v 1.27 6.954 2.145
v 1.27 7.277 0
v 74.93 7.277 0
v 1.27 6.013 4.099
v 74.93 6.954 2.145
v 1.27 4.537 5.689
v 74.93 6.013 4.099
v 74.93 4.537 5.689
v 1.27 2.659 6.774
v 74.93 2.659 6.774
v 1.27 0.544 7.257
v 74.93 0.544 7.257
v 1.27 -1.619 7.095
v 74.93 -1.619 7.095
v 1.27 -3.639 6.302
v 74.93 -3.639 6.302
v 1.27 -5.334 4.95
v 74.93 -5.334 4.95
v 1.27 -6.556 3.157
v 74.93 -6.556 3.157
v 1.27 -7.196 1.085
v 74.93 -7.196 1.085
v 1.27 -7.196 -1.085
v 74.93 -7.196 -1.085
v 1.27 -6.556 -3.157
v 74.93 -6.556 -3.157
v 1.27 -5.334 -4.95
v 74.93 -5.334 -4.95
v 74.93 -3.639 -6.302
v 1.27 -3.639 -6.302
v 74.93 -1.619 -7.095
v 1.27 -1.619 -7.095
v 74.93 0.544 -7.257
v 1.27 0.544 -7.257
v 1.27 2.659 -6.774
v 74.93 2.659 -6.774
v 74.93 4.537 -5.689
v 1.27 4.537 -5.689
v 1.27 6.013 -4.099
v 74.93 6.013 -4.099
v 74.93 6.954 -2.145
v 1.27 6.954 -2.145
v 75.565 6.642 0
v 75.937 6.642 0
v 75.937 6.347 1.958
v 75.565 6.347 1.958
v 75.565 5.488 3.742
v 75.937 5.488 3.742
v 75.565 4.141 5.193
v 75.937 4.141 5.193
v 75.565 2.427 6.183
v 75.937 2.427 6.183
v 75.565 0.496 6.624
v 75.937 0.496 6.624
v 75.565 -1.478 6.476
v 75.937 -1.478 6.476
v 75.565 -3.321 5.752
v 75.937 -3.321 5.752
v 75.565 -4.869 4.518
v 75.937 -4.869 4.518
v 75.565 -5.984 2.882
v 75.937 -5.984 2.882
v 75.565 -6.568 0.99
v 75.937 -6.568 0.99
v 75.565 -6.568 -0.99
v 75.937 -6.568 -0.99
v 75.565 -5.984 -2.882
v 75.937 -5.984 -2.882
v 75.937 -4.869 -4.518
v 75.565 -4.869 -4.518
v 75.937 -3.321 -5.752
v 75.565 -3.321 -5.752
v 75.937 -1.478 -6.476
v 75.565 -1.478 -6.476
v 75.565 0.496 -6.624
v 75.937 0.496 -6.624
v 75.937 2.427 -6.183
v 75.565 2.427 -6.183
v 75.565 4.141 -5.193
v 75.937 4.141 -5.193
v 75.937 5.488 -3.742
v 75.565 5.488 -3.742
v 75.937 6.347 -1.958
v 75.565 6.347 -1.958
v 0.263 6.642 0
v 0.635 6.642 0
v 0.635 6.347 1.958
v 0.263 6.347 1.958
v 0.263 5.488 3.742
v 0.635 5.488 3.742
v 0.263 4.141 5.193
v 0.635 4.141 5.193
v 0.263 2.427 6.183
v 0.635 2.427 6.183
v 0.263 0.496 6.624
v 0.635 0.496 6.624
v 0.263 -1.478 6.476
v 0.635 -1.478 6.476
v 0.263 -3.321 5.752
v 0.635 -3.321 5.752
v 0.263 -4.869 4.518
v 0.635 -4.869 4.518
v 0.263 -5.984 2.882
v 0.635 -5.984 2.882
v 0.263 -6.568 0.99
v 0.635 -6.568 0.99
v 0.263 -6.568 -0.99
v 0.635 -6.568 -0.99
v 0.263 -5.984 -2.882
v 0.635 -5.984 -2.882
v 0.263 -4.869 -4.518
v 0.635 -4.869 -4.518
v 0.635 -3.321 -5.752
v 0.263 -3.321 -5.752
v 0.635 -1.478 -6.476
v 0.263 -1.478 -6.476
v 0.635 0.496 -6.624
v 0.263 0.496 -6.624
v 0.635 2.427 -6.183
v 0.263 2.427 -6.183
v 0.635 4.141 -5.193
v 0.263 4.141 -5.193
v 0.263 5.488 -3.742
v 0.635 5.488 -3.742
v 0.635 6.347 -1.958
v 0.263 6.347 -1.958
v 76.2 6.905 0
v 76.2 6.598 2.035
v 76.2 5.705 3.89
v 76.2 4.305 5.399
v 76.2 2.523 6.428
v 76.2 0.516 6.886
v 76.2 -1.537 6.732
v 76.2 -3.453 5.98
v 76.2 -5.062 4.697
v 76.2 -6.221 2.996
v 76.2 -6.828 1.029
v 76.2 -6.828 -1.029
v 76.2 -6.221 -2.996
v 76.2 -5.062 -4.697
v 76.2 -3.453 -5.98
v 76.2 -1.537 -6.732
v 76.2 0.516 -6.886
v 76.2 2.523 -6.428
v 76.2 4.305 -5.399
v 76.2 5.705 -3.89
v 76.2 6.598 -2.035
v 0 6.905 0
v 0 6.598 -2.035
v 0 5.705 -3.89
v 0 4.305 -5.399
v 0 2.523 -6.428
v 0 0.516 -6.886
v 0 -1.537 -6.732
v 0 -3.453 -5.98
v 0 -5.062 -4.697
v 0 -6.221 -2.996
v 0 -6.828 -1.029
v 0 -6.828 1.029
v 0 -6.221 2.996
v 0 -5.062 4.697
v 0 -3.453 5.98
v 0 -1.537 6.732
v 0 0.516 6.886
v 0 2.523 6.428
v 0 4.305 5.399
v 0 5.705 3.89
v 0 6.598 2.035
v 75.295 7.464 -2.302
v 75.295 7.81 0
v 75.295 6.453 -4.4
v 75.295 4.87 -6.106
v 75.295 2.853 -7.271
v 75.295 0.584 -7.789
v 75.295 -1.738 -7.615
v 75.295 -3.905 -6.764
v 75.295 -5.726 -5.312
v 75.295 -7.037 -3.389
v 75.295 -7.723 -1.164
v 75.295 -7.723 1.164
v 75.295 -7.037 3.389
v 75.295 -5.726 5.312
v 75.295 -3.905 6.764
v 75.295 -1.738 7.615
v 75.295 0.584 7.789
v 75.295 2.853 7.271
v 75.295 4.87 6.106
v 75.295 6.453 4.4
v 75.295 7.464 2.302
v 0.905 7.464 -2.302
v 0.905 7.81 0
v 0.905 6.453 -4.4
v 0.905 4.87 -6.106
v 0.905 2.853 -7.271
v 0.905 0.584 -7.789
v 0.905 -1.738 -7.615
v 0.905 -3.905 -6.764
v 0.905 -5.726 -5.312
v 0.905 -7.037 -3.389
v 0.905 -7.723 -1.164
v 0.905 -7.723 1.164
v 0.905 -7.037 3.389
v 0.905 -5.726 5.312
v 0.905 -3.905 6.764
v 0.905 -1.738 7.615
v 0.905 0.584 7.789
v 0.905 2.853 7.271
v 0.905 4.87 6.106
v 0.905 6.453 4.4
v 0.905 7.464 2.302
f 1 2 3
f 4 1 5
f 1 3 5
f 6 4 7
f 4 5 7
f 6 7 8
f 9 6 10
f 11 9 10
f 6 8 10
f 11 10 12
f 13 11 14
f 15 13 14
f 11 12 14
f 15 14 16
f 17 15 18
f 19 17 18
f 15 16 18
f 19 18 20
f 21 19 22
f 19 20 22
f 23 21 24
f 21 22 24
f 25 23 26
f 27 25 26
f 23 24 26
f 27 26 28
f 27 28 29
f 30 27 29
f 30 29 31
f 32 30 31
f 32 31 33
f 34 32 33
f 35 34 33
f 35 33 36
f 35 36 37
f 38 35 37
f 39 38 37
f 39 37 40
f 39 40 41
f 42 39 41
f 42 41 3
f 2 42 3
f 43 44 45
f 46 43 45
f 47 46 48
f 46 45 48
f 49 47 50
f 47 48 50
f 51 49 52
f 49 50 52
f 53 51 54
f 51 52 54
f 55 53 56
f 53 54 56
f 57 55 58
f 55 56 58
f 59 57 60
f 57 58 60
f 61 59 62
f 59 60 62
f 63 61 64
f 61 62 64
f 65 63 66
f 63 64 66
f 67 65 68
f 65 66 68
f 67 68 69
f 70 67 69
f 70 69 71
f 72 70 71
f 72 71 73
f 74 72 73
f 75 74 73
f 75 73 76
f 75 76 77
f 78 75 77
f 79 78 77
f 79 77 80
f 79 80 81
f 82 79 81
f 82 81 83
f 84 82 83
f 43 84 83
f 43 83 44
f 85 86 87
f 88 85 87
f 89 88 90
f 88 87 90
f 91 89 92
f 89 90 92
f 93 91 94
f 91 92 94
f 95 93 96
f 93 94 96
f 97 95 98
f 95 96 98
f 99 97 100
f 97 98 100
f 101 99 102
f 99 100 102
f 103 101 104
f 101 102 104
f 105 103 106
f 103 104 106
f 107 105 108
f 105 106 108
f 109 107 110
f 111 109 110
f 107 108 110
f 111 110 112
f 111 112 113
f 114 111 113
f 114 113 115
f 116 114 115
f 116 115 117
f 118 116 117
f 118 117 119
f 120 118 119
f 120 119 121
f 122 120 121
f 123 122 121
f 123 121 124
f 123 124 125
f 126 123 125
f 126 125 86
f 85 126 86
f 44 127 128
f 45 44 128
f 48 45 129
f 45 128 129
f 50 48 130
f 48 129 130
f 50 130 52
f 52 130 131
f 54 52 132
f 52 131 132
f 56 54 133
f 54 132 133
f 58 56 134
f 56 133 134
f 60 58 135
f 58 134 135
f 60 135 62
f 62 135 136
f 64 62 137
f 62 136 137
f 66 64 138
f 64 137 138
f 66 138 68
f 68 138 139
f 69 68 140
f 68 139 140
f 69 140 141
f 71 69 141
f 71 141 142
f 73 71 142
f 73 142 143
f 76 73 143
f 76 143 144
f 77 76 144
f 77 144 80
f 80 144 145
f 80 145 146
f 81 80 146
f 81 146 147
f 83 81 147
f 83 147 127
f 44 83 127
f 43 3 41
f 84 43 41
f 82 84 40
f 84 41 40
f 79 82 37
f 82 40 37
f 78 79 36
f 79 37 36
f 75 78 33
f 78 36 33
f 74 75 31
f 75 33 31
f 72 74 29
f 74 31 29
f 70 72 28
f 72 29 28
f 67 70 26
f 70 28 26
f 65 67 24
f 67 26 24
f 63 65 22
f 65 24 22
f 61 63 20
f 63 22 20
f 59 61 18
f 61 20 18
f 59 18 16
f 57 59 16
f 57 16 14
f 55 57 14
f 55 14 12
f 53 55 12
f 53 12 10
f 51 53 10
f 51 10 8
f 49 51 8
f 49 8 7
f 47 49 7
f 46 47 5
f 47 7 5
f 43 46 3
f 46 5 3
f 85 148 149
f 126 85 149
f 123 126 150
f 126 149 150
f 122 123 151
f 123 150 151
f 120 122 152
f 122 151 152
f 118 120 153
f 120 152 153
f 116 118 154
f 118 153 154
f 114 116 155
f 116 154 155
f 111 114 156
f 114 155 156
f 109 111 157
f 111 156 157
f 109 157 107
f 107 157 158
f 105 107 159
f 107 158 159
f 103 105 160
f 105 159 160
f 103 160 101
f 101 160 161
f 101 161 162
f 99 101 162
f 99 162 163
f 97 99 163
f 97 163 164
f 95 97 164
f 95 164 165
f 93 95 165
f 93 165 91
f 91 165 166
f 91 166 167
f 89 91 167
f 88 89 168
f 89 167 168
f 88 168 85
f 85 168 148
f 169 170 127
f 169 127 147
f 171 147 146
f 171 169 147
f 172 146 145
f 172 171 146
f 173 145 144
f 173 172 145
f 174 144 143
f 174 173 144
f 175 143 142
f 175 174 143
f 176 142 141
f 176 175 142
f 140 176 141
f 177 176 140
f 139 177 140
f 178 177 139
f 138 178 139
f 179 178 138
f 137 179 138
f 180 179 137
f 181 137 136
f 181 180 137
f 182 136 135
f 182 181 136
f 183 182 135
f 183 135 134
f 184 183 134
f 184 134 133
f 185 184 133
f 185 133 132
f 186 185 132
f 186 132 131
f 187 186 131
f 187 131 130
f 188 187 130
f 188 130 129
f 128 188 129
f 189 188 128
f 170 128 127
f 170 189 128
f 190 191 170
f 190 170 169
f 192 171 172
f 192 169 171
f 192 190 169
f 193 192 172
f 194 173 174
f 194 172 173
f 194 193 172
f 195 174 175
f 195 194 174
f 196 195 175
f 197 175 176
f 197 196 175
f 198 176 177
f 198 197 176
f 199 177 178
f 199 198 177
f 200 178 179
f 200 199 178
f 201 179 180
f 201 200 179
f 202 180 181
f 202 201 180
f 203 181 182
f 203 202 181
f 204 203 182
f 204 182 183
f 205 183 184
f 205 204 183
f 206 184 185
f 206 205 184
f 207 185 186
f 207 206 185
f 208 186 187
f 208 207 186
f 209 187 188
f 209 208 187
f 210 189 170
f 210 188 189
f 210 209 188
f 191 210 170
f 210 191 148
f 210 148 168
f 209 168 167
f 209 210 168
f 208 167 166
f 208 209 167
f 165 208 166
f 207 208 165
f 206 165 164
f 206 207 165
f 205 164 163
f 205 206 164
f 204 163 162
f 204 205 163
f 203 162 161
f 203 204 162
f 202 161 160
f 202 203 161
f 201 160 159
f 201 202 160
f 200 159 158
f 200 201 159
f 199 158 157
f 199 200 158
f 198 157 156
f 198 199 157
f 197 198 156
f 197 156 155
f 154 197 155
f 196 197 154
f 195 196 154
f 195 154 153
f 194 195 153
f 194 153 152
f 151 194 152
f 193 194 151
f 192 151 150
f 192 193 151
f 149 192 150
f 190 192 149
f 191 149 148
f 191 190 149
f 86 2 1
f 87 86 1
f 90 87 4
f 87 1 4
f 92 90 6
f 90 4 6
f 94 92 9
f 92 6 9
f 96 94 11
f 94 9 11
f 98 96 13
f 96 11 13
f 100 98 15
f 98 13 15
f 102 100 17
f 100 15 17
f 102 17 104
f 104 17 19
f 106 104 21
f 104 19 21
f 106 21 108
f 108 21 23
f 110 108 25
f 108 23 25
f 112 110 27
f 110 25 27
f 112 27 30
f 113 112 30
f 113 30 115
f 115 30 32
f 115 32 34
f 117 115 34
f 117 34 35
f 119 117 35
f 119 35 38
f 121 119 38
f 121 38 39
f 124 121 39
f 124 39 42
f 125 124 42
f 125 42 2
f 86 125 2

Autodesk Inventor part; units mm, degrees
sketch "Sketch_5" plane through (0, 0, 0) normal (0, 0, 1) x (1, 0, 0)
  line L0 (76.2, 0) -> (-76.2, 0)
  line L1 (0, 6.9051) -> (0.263, 6.6421)
  line L2 (0.263, 6.6421) -> (0.635, 6.6421)
  line L3 (0.635, 6.6421) -> (1.27, 7.2771)
  line L4 (1.27, 7.2771) -> (74.93, 7.2771)
  line L5 (74.93, 7.2771) -> (75.565, 6.6421)
  line L6 (75.565, 6.6421) -> (75.937, 6.6421)
  line L7 (75.937, 6.6421) -> (76.2, 6.9051)
  line L8 (76.2, 6.9051) -> (75.2946, 7.8105)
  line L9 (75.2946, 7.8105) -> (0.9054, 7.8105)
  line L10 (0.9054, 7.8105) -> (0, 6.9051)
revolve "Revolution1" add sketch "Sketch_5" angle 360 about axis through (76.2, 0, 0) along (1, 0, 0)
ref_plane "o1_XY" through (0, -7.8105, 0) normal (1, 0, 0) x (0, 0, -1)
ref_plane "o1_YZ" through (0, -7.8105, 0) normal (0, 0, -1) x (0, 1, 0)
ref_plane "o1_ZX" through (0, -7.8105, 0) normal (0, 1, 0) x (1, 0, 0)
ref_plane "o2_XY" through (0, 7.8105, 0) normal (1, 0, 0) x (0, 0, -1)
ref_plane "o2_YZ" through (0, 7.8105, 0) normal (0, 0, -1) x (0, 1, 0)
ref_plane "o2_ZX" through (0, 7.8105, 0) normal (0, 1, 0) x (1, 0, 0)
ref_plane "t1_XY" through (38.1, 7.8105, 0) normal (1, 0, 0) x (0, 0, -1)
ref_plane "t1_YZ" through (38.1, 7.8105, 0) normal (0, 0, -1) x (0, 1, 0)
ref_plane "t1_ZX" through (38.1, 7.8105, 0) normal (0, 1, 0) x (1, 0, 0)
ref_plane "t2_XY" through (38.1, 0, -7.8105) normal (1, 0, 0) x (0, 0, -1)
ref_plane "t2_YZ" through (38.1, 0, -7.8105) normal (0, 0, -1) x (0, 1, 0)
ref_plane "t2_ZX" through (38.1, 0, -7.8105) normal (0, 1, 0) x (1, 0, 0)
ref_plane "t3_XY" through (38.1, -7.8105, 0) normal (1, 0, 0) x (0, 0, -1)
ref_plane "t3_YZ" through (38.1, -7.8105, 0) normal (0, 0, -1) x (0, 1, 0)
ref_plane "t3_ZX" through (38.1, -7.8105, 0) normal (0, 1, 0) x (1, 0, 0)
ref_plane "t4_XY" through (38.1, 0, 7.8105) normal (1, 0, 0) x (0, 0, -1)
ref_plane "t4_YZ" through (38.1, 0, 7.8105) normal (0, 0, -1) x (0, 1, 0)
ref_plane "t4_ZX" through (38.1, 0, 7.8105) normal (0, 1, 0) x (1, 0, 0)
ref_plane "tube1_XY" through (1.27, 0, 0) normal (1, 0, 0) x (0, 0, -1)
ref_plane "tube1_YZ" through (1.27, 0, 0) normal (0, 0, -1) x (0, 1, 0)
ref_plane "tube1_ZX" through (1.27, 0, 0) normal (0, 1, 0) x (1, 0, 0)
ref_plane "tube2_XY" through (74.93, 0, 0) normal (1, 0, 0) x (0, 0, -1)
ref_plane "tube2_YZ" through (74.93, 0, 0) normal (0, 0, -1) x (0, 1, 0)
ref_plane "tube2_ZX" through (74.93, 0, 0) normal (0, 1, 0) x (1, 0, 0)
properties part number "D-7516XP-3"
